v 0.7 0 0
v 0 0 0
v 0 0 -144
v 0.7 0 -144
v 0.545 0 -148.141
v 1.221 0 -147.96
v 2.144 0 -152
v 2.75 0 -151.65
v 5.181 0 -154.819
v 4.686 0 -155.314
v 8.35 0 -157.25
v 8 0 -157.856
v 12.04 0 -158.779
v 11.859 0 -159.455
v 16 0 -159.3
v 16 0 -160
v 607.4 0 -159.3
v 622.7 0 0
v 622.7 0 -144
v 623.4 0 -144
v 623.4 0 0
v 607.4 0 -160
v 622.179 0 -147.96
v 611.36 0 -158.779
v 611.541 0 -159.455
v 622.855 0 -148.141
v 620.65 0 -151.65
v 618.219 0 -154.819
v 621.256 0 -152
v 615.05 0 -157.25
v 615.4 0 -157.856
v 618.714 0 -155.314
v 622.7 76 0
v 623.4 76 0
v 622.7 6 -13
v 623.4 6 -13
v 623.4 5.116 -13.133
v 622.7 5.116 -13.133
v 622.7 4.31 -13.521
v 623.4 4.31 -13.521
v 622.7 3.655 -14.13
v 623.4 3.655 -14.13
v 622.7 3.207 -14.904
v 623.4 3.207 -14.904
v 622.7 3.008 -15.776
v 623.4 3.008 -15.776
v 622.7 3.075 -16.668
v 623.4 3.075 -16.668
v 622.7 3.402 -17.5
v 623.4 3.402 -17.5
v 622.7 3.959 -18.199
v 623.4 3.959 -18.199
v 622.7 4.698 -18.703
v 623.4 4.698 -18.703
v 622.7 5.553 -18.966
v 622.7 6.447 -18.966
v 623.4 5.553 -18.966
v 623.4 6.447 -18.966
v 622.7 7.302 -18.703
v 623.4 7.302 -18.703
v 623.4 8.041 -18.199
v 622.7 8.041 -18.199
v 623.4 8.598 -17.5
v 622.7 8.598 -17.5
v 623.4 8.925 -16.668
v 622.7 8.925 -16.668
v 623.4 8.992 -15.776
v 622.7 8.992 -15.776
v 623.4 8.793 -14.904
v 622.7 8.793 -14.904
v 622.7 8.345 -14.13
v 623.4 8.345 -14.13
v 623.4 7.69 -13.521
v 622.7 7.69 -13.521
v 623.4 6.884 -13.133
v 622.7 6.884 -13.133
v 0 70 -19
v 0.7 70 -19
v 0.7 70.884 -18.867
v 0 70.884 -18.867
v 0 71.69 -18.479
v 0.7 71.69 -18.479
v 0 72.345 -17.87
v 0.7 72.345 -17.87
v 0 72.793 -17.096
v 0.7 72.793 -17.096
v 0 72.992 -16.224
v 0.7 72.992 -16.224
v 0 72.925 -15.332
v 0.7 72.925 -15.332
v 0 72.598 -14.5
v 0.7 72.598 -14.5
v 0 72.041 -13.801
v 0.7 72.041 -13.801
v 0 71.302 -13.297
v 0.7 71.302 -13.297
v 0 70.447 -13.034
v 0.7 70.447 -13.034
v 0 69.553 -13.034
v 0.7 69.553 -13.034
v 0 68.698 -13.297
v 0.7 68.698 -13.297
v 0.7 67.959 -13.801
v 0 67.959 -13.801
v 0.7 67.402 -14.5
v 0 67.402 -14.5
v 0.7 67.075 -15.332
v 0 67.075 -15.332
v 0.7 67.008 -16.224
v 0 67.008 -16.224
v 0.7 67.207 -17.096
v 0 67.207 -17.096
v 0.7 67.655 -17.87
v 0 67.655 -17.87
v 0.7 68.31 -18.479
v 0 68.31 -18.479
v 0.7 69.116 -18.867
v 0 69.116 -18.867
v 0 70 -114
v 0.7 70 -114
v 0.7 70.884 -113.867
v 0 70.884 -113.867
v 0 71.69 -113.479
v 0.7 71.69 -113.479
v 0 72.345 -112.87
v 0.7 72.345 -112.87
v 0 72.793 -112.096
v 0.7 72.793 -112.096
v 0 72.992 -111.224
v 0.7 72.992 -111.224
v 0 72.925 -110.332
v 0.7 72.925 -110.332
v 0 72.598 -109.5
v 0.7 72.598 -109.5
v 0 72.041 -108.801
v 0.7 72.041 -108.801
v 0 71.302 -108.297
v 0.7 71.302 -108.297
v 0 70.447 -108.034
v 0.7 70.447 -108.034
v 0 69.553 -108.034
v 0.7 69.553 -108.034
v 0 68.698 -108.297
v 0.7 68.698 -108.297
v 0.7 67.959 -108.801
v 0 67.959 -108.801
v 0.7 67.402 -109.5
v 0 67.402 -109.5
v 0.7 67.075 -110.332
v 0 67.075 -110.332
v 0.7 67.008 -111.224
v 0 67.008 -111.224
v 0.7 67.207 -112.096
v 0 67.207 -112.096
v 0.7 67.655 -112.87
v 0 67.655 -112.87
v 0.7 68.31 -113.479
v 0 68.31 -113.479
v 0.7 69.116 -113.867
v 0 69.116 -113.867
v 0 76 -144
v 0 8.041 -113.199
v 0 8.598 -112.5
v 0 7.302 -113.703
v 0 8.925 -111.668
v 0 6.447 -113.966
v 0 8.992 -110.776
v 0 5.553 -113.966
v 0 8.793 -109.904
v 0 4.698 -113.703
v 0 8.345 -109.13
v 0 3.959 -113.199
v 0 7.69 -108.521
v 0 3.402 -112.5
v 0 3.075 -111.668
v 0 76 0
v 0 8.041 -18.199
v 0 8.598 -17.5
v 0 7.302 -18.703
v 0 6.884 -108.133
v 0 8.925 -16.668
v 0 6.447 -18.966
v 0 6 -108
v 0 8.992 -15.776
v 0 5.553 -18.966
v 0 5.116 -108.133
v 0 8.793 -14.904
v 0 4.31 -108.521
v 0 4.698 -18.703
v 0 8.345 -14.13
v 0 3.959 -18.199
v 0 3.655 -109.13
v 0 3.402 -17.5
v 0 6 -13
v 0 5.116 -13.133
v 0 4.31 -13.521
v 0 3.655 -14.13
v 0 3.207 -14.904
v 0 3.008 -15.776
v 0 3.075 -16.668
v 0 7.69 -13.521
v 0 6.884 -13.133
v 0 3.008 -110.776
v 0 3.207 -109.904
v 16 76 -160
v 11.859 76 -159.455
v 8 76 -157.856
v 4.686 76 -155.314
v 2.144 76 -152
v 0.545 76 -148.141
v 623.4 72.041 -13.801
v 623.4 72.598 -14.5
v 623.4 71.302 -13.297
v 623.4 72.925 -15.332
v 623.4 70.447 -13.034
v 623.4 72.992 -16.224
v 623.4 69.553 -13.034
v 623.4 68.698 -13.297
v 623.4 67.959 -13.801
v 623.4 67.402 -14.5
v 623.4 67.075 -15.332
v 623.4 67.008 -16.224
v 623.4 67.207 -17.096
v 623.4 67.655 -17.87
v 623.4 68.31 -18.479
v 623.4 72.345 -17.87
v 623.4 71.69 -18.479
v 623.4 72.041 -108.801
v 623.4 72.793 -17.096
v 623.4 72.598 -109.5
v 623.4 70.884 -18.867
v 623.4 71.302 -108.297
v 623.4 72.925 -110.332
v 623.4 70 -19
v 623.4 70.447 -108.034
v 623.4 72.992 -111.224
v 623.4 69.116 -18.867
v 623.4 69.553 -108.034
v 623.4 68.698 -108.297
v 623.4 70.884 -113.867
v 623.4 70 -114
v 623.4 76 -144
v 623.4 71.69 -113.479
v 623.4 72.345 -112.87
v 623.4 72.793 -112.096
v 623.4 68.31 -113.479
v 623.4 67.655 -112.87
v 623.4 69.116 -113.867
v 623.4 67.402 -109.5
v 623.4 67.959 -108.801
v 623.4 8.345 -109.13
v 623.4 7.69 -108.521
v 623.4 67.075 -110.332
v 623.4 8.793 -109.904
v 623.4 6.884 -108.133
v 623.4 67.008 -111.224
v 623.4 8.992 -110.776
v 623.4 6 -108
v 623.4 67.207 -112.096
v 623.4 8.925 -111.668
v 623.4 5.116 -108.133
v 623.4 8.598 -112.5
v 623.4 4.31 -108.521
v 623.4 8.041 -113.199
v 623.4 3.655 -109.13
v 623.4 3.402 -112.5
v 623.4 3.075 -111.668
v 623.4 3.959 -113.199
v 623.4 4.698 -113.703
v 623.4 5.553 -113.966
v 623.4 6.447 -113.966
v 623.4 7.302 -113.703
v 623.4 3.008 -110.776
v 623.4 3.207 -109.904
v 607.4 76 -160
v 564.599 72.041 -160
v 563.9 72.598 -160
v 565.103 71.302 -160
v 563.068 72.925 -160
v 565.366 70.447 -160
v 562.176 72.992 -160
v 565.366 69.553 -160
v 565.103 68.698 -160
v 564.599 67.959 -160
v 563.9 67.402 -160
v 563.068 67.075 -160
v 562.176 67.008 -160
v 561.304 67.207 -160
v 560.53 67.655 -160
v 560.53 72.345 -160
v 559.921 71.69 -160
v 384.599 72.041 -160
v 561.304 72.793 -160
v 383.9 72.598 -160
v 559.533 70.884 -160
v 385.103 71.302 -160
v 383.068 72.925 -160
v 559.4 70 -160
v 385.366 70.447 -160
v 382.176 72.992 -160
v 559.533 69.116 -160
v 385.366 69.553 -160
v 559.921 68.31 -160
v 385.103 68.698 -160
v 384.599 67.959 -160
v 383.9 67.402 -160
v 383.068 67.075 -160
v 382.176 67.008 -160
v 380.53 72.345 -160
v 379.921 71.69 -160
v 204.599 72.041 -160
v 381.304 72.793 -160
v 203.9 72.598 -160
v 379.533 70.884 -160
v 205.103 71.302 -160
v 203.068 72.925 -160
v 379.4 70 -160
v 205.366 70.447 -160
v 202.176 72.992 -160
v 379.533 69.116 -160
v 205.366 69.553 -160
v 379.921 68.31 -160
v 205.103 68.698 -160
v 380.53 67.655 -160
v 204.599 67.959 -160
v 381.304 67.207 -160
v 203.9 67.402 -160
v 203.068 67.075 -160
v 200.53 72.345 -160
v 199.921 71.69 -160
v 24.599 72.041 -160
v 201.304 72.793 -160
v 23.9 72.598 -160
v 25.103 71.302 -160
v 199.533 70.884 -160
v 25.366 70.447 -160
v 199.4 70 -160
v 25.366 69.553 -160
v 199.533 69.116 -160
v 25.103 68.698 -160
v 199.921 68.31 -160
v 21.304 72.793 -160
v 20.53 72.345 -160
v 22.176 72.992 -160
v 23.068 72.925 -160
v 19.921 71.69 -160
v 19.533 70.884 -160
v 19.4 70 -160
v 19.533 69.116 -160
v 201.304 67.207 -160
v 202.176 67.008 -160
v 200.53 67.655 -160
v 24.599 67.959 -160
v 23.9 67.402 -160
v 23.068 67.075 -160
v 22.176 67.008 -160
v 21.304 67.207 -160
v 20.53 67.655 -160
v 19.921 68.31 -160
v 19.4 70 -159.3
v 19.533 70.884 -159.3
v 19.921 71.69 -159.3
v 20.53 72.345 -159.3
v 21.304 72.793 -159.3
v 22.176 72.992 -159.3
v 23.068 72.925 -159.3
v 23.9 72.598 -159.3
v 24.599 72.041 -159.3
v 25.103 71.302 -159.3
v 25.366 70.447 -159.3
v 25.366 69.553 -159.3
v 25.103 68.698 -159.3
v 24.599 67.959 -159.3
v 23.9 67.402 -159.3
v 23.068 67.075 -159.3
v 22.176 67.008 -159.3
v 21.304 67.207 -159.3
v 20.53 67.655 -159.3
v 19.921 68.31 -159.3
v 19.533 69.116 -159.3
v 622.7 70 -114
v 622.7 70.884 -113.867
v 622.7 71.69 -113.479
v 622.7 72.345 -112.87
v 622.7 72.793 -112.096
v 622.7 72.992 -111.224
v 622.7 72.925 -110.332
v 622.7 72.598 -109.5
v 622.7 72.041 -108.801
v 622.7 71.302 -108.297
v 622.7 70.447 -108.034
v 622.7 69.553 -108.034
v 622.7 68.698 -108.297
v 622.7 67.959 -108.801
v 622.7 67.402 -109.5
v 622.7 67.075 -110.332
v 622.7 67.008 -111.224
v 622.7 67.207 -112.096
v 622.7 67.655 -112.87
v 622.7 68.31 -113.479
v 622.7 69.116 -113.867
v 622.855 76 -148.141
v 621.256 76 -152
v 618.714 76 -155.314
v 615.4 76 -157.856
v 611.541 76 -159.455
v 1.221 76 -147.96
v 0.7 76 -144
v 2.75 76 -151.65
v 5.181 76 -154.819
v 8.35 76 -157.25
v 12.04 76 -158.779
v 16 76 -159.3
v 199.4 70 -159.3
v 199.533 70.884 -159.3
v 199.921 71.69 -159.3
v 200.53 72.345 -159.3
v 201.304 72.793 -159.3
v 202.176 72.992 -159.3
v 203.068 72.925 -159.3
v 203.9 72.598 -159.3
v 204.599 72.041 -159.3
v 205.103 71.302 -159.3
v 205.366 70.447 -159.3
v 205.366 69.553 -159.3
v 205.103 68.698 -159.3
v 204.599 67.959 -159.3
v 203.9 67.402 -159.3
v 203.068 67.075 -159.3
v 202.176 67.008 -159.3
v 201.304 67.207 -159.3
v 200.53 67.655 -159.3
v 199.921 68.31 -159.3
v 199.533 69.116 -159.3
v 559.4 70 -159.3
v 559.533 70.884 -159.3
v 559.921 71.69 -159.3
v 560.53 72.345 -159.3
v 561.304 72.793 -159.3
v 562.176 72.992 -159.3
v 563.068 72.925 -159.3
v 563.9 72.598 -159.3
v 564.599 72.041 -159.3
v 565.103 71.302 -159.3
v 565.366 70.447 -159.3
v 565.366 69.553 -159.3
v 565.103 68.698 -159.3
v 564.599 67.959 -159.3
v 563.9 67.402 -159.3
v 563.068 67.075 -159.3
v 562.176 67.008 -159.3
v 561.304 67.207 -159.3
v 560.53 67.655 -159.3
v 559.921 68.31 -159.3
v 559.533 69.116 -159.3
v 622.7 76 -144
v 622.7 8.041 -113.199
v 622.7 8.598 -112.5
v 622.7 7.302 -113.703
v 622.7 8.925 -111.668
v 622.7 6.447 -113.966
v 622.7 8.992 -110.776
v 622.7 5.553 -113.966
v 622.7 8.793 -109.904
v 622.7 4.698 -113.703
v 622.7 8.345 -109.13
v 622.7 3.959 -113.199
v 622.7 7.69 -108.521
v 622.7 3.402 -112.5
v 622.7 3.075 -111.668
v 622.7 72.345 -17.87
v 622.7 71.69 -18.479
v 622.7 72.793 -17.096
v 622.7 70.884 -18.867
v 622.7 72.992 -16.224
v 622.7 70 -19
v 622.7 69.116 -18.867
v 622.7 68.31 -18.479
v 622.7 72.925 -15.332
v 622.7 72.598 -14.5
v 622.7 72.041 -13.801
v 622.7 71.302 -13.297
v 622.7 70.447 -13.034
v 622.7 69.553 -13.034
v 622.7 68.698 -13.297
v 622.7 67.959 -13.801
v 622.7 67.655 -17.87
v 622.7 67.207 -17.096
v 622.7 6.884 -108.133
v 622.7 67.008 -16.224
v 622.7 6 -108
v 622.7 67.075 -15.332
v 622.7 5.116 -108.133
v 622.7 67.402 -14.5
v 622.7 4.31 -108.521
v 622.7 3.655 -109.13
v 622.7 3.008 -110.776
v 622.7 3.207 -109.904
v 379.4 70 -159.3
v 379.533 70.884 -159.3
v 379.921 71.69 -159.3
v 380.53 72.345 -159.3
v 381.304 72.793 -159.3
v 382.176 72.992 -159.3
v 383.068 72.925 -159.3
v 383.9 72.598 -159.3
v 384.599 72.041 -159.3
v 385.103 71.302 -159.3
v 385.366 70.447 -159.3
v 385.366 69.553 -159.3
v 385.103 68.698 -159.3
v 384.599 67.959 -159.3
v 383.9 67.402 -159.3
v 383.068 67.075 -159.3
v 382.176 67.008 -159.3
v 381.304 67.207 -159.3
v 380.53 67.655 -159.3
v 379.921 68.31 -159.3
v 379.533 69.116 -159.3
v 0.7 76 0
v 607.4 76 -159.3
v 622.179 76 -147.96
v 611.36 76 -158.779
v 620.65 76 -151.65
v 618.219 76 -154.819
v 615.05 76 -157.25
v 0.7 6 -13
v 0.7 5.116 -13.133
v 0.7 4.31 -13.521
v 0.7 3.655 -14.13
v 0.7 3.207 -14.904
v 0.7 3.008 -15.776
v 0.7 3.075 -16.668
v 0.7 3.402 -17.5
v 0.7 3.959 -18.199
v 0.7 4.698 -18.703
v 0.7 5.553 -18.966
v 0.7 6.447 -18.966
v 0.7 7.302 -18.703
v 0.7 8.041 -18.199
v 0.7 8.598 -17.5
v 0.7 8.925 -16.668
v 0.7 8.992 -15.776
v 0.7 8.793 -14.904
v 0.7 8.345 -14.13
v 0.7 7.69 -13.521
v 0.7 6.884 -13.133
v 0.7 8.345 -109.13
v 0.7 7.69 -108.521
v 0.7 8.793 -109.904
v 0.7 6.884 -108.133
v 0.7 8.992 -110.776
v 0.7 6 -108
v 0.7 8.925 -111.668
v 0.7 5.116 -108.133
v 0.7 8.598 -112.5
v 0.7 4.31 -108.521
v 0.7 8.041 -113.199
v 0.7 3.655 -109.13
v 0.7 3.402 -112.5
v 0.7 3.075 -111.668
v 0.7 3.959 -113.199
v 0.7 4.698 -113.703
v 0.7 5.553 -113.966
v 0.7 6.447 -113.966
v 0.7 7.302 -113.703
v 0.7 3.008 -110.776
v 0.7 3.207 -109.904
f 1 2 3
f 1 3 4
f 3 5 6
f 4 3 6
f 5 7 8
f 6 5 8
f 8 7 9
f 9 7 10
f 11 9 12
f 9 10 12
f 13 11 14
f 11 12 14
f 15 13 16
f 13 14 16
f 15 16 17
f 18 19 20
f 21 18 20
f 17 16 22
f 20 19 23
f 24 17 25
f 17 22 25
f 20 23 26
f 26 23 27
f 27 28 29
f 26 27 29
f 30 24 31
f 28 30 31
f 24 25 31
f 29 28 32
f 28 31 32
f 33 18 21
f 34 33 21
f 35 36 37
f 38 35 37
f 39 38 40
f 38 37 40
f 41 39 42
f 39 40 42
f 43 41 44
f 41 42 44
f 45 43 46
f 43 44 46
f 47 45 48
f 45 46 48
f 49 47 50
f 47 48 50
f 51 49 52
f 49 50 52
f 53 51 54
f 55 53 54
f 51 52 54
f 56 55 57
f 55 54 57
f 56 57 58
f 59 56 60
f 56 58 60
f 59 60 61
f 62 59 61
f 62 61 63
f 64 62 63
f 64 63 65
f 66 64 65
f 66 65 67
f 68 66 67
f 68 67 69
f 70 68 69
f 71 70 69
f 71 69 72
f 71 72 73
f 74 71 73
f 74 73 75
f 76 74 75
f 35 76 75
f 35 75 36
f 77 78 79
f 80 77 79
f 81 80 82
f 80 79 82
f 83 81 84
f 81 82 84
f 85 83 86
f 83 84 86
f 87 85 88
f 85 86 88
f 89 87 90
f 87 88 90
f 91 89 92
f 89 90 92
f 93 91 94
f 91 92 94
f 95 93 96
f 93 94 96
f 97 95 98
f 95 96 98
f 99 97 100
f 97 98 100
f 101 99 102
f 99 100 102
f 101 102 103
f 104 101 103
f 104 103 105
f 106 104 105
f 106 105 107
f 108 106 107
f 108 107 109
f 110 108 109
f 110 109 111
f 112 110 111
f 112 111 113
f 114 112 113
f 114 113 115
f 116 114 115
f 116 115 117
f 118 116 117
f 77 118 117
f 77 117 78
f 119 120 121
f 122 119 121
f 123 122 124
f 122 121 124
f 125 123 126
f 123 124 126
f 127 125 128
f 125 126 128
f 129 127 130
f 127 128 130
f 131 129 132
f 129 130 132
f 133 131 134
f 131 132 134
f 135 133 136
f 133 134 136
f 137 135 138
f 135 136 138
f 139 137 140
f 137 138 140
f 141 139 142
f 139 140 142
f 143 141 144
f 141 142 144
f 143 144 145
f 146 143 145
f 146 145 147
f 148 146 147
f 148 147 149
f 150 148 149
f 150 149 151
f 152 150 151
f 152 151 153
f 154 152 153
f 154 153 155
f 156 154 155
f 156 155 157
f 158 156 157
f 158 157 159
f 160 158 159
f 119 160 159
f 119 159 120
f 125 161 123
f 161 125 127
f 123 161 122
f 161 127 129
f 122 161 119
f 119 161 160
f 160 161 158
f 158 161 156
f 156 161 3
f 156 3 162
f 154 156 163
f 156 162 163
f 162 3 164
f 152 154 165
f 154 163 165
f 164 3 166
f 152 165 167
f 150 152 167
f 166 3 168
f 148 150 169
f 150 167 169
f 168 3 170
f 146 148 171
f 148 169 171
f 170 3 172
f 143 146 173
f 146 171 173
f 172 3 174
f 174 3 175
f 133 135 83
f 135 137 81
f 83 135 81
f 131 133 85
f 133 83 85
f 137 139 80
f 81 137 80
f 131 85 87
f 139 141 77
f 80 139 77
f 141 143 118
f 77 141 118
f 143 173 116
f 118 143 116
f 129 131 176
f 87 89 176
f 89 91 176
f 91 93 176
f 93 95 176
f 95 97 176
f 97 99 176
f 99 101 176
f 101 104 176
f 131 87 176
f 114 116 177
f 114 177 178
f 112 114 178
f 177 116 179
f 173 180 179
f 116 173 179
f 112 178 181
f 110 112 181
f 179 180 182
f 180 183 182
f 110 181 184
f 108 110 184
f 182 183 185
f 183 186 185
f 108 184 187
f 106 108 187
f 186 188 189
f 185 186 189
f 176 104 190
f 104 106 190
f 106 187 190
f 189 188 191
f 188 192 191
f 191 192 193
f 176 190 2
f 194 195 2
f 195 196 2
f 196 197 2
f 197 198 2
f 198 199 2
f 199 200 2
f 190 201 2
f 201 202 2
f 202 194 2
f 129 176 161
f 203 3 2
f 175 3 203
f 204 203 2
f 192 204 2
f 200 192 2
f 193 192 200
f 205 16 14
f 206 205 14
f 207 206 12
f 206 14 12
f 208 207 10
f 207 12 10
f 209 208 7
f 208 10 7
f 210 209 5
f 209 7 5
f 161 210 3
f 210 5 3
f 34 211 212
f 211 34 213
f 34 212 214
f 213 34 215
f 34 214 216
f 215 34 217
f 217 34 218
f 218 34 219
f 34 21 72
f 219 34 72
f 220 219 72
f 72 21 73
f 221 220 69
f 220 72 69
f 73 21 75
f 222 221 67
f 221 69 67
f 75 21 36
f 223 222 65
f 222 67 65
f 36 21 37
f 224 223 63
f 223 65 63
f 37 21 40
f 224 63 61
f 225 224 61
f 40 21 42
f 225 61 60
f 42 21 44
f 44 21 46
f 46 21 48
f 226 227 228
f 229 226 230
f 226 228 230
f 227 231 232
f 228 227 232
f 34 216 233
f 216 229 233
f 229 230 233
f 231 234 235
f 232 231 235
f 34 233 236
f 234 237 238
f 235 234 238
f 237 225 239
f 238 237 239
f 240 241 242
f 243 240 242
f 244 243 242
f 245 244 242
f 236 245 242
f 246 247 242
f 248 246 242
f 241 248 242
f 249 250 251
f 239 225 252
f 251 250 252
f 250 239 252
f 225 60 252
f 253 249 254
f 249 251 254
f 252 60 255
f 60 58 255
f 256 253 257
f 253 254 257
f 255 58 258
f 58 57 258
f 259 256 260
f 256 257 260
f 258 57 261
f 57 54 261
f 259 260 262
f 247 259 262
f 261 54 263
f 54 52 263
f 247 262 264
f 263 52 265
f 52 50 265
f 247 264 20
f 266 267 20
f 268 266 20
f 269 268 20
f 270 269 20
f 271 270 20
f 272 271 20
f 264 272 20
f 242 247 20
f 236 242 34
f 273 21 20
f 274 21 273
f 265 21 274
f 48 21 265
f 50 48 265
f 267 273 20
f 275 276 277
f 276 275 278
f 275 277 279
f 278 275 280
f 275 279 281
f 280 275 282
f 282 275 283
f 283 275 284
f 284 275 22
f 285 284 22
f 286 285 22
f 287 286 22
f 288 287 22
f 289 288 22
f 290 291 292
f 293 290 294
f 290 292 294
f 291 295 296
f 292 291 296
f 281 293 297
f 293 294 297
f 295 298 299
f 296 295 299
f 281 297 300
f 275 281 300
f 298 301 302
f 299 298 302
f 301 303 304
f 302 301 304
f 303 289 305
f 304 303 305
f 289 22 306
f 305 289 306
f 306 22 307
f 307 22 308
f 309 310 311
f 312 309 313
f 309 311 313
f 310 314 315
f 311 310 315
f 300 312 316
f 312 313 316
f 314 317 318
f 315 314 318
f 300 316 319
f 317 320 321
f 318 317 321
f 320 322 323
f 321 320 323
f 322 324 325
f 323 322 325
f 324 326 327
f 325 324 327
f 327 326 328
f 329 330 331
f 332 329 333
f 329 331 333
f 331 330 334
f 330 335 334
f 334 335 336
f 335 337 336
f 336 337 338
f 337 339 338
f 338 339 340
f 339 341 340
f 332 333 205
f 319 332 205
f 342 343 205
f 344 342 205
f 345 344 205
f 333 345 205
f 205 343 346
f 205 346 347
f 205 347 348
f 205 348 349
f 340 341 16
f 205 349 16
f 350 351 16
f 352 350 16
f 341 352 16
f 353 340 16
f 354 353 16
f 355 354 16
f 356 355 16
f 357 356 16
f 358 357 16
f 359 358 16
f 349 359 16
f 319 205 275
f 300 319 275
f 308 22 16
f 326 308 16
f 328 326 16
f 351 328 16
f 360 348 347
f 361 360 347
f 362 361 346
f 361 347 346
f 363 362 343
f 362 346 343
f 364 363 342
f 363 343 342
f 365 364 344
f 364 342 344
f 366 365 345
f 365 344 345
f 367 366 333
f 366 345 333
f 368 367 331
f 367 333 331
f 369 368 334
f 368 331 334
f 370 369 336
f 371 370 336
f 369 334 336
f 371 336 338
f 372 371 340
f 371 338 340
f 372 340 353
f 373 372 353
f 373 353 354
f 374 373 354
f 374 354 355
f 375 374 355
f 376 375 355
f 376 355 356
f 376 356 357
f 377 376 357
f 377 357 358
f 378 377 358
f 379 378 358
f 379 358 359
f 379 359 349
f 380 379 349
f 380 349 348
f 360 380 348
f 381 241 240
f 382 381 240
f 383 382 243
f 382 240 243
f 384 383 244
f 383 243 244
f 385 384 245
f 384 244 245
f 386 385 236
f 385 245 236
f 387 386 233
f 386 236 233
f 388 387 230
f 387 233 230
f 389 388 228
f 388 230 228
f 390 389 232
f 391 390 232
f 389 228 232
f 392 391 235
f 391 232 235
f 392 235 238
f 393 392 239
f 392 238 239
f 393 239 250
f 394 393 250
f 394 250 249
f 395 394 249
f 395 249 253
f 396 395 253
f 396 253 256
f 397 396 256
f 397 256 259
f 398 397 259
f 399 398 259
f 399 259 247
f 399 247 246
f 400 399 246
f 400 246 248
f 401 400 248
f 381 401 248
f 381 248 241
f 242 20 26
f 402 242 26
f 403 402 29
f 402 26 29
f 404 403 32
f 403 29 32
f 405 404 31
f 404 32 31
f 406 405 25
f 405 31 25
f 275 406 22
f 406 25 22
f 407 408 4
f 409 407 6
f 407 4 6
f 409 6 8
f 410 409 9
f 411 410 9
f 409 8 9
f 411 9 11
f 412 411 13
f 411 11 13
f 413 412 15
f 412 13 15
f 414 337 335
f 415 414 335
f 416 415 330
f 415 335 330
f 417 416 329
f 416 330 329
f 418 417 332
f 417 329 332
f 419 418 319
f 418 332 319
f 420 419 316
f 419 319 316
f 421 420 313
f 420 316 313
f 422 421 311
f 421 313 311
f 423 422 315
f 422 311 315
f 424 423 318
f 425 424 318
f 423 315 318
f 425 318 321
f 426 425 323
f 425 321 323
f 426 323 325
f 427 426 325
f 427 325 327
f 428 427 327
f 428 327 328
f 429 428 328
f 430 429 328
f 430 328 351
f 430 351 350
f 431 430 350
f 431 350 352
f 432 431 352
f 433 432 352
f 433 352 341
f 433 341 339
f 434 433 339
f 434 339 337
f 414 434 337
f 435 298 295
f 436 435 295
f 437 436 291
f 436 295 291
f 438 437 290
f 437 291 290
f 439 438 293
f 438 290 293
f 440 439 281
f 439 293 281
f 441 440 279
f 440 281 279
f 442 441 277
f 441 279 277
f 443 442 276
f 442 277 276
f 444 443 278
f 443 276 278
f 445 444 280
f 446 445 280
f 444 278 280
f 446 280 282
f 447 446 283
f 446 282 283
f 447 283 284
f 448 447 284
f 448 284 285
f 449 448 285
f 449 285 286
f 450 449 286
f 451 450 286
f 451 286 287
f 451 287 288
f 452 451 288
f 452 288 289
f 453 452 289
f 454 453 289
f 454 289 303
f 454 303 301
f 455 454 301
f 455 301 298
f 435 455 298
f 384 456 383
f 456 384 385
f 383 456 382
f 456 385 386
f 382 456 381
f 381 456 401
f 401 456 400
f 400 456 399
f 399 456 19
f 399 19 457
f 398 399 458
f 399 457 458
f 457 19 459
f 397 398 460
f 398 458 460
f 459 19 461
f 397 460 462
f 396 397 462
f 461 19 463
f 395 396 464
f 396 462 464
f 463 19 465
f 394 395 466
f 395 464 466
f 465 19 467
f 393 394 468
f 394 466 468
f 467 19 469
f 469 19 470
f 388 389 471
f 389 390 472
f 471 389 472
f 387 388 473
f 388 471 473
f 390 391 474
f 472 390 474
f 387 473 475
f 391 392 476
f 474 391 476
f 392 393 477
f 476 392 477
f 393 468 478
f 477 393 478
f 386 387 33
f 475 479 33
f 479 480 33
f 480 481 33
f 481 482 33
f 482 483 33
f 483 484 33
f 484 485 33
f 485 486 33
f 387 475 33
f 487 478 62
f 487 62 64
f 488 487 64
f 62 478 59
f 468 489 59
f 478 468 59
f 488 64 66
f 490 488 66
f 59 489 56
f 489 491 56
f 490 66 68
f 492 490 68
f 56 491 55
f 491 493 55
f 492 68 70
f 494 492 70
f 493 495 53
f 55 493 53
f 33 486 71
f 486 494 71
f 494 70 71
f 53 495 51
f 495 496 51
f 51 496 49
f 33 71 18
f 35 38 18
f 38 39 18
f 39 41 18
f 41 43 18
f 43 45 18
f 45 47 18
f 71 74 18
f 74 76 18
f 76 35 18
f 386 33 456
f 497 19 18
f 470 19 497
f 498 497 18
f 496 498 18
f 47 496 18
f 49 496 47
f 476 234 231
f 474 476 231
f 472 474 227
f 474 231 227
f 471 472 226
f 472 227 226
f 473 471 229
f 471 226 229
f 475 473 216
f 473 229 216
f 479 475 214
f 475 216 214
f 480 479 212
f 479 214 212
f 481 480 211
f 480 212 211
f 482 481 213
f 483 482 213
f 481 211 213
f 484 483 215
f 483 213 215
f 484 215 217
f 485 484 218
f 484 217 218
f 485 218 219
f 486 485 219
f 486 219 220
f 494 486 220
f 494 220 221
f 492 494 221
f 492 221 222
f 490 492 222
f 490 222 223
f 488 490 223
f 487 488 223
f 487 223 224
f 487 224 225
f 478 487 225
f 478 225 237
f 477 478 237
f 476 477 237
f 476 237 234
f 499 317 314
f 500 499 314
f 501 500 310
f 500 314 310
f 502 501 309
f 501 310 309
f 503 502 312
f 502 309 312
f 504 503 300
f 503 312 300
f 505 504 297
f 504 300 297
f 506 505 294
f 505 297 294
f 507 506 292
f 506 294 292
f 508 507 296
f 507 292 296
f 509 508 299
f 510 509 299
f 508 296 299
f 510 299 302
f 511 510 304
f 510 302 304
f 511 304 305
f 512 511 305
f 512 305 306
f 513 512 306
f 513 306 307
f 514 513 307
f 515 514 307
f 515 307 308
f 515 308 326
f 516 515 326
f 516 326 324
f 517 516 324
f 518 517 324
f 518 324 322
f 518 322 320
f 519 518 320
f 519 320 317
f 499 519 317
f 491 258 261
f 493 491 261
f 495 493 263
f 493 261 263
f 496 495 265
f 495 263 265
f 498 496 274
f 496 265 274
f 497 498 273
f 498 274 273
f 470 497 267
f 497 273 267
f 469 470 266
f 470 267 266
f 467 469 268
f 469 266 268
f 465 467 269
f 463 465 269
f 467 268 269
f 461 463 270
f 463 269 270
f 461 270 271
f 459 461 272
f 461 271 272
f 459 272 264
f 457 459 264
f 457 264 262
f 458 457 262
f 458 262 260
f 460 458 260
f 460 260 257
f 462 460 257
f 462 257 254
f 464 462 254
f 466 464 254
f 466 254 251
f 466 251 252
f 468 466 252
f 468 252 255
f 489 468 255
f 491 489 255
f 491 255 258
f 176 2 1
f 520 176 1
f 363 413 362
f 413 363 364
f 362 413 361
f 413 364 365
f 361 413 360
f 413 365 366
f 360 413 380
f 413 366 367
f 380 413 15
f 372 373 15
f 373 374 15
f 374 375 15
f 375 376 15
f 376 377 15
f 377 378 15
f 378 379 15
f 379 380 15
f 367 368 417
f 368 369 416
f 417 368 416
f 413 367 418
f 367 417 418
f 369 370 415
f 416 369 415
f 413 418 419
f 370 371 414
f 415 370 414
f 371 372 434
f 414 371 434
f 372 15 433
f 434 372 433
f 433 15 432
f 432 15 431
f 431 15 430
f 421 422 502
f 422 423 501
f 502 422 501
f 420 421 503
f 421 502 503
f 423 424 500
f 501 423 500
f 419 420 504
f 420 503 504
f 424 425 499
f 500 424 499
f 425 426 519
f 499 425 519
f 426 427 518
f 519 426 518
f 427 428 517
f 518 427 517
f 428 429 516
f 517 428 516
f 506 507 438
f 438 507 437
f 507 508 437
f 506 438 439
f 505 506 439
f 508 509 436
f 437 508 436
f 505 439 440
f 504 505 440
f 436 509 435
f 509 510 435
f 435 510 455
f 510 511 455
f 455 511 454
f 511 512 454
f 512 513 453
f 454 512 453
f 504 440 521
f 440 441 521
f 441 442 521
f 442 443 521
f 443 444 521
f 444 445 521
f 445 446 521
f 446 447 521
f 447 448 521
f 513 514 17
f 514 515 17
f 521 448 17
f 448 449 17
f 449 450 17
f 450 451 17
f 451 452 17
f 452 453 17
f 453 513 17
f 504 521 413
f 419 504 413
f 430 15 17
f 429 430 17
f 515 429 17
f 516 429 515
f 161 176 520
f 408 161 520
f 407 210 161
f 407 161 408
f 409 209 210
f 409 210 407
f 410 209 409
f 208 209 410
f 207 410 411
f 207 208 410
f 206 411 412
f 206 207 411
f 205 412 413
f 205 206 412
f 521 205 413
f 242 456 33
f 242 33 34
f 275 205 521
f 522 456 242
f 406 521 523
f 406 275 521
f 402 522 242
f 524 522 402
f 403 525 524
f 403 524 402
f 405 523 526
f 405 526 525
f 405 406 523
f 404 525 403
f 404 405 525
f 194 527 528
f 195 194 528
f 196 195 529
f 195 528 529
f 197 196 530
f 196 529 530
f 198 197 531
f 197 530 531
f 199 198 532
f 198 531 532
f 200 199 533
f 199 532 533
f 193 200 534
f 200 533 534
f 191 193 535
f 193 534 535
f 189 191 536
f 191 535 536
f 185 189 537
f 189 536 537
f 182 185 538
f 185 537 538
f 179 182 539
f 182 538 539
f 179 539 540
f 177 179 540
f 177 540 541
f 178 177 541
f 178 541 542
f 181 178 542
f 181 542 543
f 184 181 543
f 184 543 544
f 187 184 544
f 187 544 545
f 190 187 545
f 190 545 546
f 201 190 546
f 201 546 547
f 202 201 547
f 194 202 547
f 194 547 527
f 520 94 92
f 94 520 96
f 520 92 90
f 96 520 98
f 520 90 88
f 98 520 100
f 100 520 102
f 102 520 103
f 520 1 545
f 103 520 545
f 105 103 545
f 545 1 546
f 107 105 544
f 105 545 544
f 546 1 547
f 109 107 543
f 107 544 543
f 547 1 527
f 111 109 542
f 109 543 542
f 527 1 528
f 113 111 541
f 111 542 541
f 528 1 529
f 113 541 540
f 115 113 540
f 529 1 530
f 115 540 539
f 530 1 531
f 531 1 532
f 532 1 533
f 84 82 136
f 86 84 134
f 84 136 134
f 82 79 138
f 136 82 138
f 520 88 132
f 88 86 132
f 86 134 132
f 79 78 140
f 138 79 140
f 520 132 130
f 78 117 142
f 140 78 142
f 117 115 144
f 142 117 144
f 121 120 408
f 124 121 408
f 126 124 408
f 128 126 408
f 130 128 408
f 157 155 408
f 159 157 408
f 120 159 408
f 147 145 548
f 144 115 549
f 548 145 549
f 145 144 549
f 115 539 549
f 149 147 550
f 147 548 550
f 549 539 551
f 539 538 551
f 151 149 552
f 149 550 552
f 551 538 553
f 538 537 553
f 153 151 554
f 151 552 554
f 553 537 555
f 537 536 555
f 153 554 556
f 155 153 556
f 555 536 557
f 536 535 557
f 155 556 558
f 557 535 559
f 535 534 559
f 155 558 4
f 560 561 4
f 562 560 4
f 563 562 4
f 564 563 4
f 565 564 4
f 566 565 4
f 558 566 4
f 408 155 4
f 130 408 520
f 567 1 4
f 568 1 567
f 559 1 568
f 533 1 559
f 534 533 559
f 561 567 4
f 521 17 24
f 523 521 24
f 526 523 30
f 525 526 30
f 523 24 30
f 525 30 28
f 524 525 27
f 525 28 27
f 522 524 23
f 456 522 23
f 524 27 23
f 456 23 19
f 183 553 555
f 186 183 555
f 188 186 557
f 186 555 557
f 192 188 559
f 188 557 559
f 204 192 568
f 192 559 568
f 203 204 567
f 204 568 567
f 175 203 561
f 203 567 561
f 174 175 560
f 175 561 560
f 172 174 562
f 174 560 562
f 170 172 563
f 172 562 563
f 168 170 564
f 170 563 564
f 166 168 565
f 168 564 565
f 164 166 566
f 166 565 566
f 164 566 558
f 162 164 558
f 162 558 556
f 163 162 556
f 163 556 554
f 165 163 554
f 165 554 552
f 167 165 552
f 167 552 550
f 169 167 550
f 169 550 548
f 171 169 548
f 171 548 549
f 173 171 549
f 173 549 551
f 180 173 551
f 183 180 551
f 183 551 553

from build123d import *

# Parameters (mm, degrees)
BASE_FLANGE1_DEPTH = 76
SKETCH2_R          = 3
CUT_EXTRUDE1_DEPTH = 649.076816435
SKETCH3_R          = 3
CUT_EXTRUDE2_DEPTH = 10


# Read off the part's stored shape, not the designer's step: Base-Flange1
with BuildPart() as part:
    # Base-Flange1 outline → Base-Flange1 (new body)
    with BuildSketch(Plane(origin=(0, 0, 0), x_dir=(1, 0, 0), z_dir=(0, 1, 0))):
        with BuildLine():
            Line((622.7, 144), (622.7, 0))
            Line((622.7, 0), (623.4, 0))
            Line((623.4, 0), (623.4, 144))
            ThreePointArc((623.4, 144), (618.713708499, 155.313708499), (607.4, 160))
            Line((607.4, 160), (16, 160))
            ThreePointArc((16, 160), (4.686291501, 155.313708499), (0, 144))
            Line((0, 144), (0, 0))
            Line((0, 0), (0.7, 0))
            Line((0.7, 0), (0.7, 144))
            ThreePointArc((0.7, 144), (5.181266248, 154.818733752), (16, 159.3))
            Line((16, 159.3), (607.4, 159.3))
            ThreePointArc((607.4, 159.3), (618.218733752, 154.818733752), (622.7, 144))
        make_face()
    extrude(amount=BASE_FLANGE1_DEPTH)

    # Sketch2 → Cut-Extrude1 (cut, through all)
    with BuildSketch(Plane(origin=(623.4, 0, 0), x_dir=(0, 0, -1), z_dir=(1, 0, 0))):
        with Locations((16, 70)):
            Circle(SKETCH2_R)
        with Locations((111, 70)):
            Circle(SKETCH2_R)
        with Locations(Location((111, 6, 0), (0, 0, 180))):
            Circle(SKETCH2_R)
        with Locations(Location((16, 6, 0), (0, 0, 180))):
            Circle(SKETCH2_R)
    extrude(amount=-CUT_EXTRUDE1_DEPTH, mode=Mode.SUBTRACT)

    # Sketch3 → Cut-Extrude2 (cut)
    with BuildSketch(Plane(origin=(0, 0, -160), x_dir=(-1, 0, 0), z_dir=(0, 0, -1))):
        with Locations((-562.4, 70)):
            Circle(SKETCH3_R)
        with Locations((-382.4, 70)):
            Circle(SKETCH3_R)
        with Locations((-202.4, 70)):
            Circle(SKETCH3_R)
        with Locations((-22.4, 70)):
            Circle(SKETCH3_R)
        with Locations((157.6, 70)):
            Circle(SKETCH3_R)
        with Locations((337.6, 70)):
            Circle(SKETCH3_R)
        with Locations((517.6, 70)):
            Circle(SKETCH3_R)
        with Locations((-382.4, -22)):
            Circle(SKETCH3_R)
        with Locations((-202.4, -22)):
            Circle(SKETCH3_R)
        with Locations((-22.4, -22)):
            Circle(SKETCH3_R)
        with Locations((157.6, -22)):
            Circle(SKETCH3_R)
        with Locations((337.6, -22)):
            Circle(SKETCH3_R)
        with Locations((517.6, -22)):
            Circle(SKETCH3_R)
        with Locations((-562.4, -22)):
            Circle(SKETCH3_R)
    extrude(amount=-CUT_EXTRUDE2_DEPTH, mode=Mode.SUBTRACT)


solid = part.part
